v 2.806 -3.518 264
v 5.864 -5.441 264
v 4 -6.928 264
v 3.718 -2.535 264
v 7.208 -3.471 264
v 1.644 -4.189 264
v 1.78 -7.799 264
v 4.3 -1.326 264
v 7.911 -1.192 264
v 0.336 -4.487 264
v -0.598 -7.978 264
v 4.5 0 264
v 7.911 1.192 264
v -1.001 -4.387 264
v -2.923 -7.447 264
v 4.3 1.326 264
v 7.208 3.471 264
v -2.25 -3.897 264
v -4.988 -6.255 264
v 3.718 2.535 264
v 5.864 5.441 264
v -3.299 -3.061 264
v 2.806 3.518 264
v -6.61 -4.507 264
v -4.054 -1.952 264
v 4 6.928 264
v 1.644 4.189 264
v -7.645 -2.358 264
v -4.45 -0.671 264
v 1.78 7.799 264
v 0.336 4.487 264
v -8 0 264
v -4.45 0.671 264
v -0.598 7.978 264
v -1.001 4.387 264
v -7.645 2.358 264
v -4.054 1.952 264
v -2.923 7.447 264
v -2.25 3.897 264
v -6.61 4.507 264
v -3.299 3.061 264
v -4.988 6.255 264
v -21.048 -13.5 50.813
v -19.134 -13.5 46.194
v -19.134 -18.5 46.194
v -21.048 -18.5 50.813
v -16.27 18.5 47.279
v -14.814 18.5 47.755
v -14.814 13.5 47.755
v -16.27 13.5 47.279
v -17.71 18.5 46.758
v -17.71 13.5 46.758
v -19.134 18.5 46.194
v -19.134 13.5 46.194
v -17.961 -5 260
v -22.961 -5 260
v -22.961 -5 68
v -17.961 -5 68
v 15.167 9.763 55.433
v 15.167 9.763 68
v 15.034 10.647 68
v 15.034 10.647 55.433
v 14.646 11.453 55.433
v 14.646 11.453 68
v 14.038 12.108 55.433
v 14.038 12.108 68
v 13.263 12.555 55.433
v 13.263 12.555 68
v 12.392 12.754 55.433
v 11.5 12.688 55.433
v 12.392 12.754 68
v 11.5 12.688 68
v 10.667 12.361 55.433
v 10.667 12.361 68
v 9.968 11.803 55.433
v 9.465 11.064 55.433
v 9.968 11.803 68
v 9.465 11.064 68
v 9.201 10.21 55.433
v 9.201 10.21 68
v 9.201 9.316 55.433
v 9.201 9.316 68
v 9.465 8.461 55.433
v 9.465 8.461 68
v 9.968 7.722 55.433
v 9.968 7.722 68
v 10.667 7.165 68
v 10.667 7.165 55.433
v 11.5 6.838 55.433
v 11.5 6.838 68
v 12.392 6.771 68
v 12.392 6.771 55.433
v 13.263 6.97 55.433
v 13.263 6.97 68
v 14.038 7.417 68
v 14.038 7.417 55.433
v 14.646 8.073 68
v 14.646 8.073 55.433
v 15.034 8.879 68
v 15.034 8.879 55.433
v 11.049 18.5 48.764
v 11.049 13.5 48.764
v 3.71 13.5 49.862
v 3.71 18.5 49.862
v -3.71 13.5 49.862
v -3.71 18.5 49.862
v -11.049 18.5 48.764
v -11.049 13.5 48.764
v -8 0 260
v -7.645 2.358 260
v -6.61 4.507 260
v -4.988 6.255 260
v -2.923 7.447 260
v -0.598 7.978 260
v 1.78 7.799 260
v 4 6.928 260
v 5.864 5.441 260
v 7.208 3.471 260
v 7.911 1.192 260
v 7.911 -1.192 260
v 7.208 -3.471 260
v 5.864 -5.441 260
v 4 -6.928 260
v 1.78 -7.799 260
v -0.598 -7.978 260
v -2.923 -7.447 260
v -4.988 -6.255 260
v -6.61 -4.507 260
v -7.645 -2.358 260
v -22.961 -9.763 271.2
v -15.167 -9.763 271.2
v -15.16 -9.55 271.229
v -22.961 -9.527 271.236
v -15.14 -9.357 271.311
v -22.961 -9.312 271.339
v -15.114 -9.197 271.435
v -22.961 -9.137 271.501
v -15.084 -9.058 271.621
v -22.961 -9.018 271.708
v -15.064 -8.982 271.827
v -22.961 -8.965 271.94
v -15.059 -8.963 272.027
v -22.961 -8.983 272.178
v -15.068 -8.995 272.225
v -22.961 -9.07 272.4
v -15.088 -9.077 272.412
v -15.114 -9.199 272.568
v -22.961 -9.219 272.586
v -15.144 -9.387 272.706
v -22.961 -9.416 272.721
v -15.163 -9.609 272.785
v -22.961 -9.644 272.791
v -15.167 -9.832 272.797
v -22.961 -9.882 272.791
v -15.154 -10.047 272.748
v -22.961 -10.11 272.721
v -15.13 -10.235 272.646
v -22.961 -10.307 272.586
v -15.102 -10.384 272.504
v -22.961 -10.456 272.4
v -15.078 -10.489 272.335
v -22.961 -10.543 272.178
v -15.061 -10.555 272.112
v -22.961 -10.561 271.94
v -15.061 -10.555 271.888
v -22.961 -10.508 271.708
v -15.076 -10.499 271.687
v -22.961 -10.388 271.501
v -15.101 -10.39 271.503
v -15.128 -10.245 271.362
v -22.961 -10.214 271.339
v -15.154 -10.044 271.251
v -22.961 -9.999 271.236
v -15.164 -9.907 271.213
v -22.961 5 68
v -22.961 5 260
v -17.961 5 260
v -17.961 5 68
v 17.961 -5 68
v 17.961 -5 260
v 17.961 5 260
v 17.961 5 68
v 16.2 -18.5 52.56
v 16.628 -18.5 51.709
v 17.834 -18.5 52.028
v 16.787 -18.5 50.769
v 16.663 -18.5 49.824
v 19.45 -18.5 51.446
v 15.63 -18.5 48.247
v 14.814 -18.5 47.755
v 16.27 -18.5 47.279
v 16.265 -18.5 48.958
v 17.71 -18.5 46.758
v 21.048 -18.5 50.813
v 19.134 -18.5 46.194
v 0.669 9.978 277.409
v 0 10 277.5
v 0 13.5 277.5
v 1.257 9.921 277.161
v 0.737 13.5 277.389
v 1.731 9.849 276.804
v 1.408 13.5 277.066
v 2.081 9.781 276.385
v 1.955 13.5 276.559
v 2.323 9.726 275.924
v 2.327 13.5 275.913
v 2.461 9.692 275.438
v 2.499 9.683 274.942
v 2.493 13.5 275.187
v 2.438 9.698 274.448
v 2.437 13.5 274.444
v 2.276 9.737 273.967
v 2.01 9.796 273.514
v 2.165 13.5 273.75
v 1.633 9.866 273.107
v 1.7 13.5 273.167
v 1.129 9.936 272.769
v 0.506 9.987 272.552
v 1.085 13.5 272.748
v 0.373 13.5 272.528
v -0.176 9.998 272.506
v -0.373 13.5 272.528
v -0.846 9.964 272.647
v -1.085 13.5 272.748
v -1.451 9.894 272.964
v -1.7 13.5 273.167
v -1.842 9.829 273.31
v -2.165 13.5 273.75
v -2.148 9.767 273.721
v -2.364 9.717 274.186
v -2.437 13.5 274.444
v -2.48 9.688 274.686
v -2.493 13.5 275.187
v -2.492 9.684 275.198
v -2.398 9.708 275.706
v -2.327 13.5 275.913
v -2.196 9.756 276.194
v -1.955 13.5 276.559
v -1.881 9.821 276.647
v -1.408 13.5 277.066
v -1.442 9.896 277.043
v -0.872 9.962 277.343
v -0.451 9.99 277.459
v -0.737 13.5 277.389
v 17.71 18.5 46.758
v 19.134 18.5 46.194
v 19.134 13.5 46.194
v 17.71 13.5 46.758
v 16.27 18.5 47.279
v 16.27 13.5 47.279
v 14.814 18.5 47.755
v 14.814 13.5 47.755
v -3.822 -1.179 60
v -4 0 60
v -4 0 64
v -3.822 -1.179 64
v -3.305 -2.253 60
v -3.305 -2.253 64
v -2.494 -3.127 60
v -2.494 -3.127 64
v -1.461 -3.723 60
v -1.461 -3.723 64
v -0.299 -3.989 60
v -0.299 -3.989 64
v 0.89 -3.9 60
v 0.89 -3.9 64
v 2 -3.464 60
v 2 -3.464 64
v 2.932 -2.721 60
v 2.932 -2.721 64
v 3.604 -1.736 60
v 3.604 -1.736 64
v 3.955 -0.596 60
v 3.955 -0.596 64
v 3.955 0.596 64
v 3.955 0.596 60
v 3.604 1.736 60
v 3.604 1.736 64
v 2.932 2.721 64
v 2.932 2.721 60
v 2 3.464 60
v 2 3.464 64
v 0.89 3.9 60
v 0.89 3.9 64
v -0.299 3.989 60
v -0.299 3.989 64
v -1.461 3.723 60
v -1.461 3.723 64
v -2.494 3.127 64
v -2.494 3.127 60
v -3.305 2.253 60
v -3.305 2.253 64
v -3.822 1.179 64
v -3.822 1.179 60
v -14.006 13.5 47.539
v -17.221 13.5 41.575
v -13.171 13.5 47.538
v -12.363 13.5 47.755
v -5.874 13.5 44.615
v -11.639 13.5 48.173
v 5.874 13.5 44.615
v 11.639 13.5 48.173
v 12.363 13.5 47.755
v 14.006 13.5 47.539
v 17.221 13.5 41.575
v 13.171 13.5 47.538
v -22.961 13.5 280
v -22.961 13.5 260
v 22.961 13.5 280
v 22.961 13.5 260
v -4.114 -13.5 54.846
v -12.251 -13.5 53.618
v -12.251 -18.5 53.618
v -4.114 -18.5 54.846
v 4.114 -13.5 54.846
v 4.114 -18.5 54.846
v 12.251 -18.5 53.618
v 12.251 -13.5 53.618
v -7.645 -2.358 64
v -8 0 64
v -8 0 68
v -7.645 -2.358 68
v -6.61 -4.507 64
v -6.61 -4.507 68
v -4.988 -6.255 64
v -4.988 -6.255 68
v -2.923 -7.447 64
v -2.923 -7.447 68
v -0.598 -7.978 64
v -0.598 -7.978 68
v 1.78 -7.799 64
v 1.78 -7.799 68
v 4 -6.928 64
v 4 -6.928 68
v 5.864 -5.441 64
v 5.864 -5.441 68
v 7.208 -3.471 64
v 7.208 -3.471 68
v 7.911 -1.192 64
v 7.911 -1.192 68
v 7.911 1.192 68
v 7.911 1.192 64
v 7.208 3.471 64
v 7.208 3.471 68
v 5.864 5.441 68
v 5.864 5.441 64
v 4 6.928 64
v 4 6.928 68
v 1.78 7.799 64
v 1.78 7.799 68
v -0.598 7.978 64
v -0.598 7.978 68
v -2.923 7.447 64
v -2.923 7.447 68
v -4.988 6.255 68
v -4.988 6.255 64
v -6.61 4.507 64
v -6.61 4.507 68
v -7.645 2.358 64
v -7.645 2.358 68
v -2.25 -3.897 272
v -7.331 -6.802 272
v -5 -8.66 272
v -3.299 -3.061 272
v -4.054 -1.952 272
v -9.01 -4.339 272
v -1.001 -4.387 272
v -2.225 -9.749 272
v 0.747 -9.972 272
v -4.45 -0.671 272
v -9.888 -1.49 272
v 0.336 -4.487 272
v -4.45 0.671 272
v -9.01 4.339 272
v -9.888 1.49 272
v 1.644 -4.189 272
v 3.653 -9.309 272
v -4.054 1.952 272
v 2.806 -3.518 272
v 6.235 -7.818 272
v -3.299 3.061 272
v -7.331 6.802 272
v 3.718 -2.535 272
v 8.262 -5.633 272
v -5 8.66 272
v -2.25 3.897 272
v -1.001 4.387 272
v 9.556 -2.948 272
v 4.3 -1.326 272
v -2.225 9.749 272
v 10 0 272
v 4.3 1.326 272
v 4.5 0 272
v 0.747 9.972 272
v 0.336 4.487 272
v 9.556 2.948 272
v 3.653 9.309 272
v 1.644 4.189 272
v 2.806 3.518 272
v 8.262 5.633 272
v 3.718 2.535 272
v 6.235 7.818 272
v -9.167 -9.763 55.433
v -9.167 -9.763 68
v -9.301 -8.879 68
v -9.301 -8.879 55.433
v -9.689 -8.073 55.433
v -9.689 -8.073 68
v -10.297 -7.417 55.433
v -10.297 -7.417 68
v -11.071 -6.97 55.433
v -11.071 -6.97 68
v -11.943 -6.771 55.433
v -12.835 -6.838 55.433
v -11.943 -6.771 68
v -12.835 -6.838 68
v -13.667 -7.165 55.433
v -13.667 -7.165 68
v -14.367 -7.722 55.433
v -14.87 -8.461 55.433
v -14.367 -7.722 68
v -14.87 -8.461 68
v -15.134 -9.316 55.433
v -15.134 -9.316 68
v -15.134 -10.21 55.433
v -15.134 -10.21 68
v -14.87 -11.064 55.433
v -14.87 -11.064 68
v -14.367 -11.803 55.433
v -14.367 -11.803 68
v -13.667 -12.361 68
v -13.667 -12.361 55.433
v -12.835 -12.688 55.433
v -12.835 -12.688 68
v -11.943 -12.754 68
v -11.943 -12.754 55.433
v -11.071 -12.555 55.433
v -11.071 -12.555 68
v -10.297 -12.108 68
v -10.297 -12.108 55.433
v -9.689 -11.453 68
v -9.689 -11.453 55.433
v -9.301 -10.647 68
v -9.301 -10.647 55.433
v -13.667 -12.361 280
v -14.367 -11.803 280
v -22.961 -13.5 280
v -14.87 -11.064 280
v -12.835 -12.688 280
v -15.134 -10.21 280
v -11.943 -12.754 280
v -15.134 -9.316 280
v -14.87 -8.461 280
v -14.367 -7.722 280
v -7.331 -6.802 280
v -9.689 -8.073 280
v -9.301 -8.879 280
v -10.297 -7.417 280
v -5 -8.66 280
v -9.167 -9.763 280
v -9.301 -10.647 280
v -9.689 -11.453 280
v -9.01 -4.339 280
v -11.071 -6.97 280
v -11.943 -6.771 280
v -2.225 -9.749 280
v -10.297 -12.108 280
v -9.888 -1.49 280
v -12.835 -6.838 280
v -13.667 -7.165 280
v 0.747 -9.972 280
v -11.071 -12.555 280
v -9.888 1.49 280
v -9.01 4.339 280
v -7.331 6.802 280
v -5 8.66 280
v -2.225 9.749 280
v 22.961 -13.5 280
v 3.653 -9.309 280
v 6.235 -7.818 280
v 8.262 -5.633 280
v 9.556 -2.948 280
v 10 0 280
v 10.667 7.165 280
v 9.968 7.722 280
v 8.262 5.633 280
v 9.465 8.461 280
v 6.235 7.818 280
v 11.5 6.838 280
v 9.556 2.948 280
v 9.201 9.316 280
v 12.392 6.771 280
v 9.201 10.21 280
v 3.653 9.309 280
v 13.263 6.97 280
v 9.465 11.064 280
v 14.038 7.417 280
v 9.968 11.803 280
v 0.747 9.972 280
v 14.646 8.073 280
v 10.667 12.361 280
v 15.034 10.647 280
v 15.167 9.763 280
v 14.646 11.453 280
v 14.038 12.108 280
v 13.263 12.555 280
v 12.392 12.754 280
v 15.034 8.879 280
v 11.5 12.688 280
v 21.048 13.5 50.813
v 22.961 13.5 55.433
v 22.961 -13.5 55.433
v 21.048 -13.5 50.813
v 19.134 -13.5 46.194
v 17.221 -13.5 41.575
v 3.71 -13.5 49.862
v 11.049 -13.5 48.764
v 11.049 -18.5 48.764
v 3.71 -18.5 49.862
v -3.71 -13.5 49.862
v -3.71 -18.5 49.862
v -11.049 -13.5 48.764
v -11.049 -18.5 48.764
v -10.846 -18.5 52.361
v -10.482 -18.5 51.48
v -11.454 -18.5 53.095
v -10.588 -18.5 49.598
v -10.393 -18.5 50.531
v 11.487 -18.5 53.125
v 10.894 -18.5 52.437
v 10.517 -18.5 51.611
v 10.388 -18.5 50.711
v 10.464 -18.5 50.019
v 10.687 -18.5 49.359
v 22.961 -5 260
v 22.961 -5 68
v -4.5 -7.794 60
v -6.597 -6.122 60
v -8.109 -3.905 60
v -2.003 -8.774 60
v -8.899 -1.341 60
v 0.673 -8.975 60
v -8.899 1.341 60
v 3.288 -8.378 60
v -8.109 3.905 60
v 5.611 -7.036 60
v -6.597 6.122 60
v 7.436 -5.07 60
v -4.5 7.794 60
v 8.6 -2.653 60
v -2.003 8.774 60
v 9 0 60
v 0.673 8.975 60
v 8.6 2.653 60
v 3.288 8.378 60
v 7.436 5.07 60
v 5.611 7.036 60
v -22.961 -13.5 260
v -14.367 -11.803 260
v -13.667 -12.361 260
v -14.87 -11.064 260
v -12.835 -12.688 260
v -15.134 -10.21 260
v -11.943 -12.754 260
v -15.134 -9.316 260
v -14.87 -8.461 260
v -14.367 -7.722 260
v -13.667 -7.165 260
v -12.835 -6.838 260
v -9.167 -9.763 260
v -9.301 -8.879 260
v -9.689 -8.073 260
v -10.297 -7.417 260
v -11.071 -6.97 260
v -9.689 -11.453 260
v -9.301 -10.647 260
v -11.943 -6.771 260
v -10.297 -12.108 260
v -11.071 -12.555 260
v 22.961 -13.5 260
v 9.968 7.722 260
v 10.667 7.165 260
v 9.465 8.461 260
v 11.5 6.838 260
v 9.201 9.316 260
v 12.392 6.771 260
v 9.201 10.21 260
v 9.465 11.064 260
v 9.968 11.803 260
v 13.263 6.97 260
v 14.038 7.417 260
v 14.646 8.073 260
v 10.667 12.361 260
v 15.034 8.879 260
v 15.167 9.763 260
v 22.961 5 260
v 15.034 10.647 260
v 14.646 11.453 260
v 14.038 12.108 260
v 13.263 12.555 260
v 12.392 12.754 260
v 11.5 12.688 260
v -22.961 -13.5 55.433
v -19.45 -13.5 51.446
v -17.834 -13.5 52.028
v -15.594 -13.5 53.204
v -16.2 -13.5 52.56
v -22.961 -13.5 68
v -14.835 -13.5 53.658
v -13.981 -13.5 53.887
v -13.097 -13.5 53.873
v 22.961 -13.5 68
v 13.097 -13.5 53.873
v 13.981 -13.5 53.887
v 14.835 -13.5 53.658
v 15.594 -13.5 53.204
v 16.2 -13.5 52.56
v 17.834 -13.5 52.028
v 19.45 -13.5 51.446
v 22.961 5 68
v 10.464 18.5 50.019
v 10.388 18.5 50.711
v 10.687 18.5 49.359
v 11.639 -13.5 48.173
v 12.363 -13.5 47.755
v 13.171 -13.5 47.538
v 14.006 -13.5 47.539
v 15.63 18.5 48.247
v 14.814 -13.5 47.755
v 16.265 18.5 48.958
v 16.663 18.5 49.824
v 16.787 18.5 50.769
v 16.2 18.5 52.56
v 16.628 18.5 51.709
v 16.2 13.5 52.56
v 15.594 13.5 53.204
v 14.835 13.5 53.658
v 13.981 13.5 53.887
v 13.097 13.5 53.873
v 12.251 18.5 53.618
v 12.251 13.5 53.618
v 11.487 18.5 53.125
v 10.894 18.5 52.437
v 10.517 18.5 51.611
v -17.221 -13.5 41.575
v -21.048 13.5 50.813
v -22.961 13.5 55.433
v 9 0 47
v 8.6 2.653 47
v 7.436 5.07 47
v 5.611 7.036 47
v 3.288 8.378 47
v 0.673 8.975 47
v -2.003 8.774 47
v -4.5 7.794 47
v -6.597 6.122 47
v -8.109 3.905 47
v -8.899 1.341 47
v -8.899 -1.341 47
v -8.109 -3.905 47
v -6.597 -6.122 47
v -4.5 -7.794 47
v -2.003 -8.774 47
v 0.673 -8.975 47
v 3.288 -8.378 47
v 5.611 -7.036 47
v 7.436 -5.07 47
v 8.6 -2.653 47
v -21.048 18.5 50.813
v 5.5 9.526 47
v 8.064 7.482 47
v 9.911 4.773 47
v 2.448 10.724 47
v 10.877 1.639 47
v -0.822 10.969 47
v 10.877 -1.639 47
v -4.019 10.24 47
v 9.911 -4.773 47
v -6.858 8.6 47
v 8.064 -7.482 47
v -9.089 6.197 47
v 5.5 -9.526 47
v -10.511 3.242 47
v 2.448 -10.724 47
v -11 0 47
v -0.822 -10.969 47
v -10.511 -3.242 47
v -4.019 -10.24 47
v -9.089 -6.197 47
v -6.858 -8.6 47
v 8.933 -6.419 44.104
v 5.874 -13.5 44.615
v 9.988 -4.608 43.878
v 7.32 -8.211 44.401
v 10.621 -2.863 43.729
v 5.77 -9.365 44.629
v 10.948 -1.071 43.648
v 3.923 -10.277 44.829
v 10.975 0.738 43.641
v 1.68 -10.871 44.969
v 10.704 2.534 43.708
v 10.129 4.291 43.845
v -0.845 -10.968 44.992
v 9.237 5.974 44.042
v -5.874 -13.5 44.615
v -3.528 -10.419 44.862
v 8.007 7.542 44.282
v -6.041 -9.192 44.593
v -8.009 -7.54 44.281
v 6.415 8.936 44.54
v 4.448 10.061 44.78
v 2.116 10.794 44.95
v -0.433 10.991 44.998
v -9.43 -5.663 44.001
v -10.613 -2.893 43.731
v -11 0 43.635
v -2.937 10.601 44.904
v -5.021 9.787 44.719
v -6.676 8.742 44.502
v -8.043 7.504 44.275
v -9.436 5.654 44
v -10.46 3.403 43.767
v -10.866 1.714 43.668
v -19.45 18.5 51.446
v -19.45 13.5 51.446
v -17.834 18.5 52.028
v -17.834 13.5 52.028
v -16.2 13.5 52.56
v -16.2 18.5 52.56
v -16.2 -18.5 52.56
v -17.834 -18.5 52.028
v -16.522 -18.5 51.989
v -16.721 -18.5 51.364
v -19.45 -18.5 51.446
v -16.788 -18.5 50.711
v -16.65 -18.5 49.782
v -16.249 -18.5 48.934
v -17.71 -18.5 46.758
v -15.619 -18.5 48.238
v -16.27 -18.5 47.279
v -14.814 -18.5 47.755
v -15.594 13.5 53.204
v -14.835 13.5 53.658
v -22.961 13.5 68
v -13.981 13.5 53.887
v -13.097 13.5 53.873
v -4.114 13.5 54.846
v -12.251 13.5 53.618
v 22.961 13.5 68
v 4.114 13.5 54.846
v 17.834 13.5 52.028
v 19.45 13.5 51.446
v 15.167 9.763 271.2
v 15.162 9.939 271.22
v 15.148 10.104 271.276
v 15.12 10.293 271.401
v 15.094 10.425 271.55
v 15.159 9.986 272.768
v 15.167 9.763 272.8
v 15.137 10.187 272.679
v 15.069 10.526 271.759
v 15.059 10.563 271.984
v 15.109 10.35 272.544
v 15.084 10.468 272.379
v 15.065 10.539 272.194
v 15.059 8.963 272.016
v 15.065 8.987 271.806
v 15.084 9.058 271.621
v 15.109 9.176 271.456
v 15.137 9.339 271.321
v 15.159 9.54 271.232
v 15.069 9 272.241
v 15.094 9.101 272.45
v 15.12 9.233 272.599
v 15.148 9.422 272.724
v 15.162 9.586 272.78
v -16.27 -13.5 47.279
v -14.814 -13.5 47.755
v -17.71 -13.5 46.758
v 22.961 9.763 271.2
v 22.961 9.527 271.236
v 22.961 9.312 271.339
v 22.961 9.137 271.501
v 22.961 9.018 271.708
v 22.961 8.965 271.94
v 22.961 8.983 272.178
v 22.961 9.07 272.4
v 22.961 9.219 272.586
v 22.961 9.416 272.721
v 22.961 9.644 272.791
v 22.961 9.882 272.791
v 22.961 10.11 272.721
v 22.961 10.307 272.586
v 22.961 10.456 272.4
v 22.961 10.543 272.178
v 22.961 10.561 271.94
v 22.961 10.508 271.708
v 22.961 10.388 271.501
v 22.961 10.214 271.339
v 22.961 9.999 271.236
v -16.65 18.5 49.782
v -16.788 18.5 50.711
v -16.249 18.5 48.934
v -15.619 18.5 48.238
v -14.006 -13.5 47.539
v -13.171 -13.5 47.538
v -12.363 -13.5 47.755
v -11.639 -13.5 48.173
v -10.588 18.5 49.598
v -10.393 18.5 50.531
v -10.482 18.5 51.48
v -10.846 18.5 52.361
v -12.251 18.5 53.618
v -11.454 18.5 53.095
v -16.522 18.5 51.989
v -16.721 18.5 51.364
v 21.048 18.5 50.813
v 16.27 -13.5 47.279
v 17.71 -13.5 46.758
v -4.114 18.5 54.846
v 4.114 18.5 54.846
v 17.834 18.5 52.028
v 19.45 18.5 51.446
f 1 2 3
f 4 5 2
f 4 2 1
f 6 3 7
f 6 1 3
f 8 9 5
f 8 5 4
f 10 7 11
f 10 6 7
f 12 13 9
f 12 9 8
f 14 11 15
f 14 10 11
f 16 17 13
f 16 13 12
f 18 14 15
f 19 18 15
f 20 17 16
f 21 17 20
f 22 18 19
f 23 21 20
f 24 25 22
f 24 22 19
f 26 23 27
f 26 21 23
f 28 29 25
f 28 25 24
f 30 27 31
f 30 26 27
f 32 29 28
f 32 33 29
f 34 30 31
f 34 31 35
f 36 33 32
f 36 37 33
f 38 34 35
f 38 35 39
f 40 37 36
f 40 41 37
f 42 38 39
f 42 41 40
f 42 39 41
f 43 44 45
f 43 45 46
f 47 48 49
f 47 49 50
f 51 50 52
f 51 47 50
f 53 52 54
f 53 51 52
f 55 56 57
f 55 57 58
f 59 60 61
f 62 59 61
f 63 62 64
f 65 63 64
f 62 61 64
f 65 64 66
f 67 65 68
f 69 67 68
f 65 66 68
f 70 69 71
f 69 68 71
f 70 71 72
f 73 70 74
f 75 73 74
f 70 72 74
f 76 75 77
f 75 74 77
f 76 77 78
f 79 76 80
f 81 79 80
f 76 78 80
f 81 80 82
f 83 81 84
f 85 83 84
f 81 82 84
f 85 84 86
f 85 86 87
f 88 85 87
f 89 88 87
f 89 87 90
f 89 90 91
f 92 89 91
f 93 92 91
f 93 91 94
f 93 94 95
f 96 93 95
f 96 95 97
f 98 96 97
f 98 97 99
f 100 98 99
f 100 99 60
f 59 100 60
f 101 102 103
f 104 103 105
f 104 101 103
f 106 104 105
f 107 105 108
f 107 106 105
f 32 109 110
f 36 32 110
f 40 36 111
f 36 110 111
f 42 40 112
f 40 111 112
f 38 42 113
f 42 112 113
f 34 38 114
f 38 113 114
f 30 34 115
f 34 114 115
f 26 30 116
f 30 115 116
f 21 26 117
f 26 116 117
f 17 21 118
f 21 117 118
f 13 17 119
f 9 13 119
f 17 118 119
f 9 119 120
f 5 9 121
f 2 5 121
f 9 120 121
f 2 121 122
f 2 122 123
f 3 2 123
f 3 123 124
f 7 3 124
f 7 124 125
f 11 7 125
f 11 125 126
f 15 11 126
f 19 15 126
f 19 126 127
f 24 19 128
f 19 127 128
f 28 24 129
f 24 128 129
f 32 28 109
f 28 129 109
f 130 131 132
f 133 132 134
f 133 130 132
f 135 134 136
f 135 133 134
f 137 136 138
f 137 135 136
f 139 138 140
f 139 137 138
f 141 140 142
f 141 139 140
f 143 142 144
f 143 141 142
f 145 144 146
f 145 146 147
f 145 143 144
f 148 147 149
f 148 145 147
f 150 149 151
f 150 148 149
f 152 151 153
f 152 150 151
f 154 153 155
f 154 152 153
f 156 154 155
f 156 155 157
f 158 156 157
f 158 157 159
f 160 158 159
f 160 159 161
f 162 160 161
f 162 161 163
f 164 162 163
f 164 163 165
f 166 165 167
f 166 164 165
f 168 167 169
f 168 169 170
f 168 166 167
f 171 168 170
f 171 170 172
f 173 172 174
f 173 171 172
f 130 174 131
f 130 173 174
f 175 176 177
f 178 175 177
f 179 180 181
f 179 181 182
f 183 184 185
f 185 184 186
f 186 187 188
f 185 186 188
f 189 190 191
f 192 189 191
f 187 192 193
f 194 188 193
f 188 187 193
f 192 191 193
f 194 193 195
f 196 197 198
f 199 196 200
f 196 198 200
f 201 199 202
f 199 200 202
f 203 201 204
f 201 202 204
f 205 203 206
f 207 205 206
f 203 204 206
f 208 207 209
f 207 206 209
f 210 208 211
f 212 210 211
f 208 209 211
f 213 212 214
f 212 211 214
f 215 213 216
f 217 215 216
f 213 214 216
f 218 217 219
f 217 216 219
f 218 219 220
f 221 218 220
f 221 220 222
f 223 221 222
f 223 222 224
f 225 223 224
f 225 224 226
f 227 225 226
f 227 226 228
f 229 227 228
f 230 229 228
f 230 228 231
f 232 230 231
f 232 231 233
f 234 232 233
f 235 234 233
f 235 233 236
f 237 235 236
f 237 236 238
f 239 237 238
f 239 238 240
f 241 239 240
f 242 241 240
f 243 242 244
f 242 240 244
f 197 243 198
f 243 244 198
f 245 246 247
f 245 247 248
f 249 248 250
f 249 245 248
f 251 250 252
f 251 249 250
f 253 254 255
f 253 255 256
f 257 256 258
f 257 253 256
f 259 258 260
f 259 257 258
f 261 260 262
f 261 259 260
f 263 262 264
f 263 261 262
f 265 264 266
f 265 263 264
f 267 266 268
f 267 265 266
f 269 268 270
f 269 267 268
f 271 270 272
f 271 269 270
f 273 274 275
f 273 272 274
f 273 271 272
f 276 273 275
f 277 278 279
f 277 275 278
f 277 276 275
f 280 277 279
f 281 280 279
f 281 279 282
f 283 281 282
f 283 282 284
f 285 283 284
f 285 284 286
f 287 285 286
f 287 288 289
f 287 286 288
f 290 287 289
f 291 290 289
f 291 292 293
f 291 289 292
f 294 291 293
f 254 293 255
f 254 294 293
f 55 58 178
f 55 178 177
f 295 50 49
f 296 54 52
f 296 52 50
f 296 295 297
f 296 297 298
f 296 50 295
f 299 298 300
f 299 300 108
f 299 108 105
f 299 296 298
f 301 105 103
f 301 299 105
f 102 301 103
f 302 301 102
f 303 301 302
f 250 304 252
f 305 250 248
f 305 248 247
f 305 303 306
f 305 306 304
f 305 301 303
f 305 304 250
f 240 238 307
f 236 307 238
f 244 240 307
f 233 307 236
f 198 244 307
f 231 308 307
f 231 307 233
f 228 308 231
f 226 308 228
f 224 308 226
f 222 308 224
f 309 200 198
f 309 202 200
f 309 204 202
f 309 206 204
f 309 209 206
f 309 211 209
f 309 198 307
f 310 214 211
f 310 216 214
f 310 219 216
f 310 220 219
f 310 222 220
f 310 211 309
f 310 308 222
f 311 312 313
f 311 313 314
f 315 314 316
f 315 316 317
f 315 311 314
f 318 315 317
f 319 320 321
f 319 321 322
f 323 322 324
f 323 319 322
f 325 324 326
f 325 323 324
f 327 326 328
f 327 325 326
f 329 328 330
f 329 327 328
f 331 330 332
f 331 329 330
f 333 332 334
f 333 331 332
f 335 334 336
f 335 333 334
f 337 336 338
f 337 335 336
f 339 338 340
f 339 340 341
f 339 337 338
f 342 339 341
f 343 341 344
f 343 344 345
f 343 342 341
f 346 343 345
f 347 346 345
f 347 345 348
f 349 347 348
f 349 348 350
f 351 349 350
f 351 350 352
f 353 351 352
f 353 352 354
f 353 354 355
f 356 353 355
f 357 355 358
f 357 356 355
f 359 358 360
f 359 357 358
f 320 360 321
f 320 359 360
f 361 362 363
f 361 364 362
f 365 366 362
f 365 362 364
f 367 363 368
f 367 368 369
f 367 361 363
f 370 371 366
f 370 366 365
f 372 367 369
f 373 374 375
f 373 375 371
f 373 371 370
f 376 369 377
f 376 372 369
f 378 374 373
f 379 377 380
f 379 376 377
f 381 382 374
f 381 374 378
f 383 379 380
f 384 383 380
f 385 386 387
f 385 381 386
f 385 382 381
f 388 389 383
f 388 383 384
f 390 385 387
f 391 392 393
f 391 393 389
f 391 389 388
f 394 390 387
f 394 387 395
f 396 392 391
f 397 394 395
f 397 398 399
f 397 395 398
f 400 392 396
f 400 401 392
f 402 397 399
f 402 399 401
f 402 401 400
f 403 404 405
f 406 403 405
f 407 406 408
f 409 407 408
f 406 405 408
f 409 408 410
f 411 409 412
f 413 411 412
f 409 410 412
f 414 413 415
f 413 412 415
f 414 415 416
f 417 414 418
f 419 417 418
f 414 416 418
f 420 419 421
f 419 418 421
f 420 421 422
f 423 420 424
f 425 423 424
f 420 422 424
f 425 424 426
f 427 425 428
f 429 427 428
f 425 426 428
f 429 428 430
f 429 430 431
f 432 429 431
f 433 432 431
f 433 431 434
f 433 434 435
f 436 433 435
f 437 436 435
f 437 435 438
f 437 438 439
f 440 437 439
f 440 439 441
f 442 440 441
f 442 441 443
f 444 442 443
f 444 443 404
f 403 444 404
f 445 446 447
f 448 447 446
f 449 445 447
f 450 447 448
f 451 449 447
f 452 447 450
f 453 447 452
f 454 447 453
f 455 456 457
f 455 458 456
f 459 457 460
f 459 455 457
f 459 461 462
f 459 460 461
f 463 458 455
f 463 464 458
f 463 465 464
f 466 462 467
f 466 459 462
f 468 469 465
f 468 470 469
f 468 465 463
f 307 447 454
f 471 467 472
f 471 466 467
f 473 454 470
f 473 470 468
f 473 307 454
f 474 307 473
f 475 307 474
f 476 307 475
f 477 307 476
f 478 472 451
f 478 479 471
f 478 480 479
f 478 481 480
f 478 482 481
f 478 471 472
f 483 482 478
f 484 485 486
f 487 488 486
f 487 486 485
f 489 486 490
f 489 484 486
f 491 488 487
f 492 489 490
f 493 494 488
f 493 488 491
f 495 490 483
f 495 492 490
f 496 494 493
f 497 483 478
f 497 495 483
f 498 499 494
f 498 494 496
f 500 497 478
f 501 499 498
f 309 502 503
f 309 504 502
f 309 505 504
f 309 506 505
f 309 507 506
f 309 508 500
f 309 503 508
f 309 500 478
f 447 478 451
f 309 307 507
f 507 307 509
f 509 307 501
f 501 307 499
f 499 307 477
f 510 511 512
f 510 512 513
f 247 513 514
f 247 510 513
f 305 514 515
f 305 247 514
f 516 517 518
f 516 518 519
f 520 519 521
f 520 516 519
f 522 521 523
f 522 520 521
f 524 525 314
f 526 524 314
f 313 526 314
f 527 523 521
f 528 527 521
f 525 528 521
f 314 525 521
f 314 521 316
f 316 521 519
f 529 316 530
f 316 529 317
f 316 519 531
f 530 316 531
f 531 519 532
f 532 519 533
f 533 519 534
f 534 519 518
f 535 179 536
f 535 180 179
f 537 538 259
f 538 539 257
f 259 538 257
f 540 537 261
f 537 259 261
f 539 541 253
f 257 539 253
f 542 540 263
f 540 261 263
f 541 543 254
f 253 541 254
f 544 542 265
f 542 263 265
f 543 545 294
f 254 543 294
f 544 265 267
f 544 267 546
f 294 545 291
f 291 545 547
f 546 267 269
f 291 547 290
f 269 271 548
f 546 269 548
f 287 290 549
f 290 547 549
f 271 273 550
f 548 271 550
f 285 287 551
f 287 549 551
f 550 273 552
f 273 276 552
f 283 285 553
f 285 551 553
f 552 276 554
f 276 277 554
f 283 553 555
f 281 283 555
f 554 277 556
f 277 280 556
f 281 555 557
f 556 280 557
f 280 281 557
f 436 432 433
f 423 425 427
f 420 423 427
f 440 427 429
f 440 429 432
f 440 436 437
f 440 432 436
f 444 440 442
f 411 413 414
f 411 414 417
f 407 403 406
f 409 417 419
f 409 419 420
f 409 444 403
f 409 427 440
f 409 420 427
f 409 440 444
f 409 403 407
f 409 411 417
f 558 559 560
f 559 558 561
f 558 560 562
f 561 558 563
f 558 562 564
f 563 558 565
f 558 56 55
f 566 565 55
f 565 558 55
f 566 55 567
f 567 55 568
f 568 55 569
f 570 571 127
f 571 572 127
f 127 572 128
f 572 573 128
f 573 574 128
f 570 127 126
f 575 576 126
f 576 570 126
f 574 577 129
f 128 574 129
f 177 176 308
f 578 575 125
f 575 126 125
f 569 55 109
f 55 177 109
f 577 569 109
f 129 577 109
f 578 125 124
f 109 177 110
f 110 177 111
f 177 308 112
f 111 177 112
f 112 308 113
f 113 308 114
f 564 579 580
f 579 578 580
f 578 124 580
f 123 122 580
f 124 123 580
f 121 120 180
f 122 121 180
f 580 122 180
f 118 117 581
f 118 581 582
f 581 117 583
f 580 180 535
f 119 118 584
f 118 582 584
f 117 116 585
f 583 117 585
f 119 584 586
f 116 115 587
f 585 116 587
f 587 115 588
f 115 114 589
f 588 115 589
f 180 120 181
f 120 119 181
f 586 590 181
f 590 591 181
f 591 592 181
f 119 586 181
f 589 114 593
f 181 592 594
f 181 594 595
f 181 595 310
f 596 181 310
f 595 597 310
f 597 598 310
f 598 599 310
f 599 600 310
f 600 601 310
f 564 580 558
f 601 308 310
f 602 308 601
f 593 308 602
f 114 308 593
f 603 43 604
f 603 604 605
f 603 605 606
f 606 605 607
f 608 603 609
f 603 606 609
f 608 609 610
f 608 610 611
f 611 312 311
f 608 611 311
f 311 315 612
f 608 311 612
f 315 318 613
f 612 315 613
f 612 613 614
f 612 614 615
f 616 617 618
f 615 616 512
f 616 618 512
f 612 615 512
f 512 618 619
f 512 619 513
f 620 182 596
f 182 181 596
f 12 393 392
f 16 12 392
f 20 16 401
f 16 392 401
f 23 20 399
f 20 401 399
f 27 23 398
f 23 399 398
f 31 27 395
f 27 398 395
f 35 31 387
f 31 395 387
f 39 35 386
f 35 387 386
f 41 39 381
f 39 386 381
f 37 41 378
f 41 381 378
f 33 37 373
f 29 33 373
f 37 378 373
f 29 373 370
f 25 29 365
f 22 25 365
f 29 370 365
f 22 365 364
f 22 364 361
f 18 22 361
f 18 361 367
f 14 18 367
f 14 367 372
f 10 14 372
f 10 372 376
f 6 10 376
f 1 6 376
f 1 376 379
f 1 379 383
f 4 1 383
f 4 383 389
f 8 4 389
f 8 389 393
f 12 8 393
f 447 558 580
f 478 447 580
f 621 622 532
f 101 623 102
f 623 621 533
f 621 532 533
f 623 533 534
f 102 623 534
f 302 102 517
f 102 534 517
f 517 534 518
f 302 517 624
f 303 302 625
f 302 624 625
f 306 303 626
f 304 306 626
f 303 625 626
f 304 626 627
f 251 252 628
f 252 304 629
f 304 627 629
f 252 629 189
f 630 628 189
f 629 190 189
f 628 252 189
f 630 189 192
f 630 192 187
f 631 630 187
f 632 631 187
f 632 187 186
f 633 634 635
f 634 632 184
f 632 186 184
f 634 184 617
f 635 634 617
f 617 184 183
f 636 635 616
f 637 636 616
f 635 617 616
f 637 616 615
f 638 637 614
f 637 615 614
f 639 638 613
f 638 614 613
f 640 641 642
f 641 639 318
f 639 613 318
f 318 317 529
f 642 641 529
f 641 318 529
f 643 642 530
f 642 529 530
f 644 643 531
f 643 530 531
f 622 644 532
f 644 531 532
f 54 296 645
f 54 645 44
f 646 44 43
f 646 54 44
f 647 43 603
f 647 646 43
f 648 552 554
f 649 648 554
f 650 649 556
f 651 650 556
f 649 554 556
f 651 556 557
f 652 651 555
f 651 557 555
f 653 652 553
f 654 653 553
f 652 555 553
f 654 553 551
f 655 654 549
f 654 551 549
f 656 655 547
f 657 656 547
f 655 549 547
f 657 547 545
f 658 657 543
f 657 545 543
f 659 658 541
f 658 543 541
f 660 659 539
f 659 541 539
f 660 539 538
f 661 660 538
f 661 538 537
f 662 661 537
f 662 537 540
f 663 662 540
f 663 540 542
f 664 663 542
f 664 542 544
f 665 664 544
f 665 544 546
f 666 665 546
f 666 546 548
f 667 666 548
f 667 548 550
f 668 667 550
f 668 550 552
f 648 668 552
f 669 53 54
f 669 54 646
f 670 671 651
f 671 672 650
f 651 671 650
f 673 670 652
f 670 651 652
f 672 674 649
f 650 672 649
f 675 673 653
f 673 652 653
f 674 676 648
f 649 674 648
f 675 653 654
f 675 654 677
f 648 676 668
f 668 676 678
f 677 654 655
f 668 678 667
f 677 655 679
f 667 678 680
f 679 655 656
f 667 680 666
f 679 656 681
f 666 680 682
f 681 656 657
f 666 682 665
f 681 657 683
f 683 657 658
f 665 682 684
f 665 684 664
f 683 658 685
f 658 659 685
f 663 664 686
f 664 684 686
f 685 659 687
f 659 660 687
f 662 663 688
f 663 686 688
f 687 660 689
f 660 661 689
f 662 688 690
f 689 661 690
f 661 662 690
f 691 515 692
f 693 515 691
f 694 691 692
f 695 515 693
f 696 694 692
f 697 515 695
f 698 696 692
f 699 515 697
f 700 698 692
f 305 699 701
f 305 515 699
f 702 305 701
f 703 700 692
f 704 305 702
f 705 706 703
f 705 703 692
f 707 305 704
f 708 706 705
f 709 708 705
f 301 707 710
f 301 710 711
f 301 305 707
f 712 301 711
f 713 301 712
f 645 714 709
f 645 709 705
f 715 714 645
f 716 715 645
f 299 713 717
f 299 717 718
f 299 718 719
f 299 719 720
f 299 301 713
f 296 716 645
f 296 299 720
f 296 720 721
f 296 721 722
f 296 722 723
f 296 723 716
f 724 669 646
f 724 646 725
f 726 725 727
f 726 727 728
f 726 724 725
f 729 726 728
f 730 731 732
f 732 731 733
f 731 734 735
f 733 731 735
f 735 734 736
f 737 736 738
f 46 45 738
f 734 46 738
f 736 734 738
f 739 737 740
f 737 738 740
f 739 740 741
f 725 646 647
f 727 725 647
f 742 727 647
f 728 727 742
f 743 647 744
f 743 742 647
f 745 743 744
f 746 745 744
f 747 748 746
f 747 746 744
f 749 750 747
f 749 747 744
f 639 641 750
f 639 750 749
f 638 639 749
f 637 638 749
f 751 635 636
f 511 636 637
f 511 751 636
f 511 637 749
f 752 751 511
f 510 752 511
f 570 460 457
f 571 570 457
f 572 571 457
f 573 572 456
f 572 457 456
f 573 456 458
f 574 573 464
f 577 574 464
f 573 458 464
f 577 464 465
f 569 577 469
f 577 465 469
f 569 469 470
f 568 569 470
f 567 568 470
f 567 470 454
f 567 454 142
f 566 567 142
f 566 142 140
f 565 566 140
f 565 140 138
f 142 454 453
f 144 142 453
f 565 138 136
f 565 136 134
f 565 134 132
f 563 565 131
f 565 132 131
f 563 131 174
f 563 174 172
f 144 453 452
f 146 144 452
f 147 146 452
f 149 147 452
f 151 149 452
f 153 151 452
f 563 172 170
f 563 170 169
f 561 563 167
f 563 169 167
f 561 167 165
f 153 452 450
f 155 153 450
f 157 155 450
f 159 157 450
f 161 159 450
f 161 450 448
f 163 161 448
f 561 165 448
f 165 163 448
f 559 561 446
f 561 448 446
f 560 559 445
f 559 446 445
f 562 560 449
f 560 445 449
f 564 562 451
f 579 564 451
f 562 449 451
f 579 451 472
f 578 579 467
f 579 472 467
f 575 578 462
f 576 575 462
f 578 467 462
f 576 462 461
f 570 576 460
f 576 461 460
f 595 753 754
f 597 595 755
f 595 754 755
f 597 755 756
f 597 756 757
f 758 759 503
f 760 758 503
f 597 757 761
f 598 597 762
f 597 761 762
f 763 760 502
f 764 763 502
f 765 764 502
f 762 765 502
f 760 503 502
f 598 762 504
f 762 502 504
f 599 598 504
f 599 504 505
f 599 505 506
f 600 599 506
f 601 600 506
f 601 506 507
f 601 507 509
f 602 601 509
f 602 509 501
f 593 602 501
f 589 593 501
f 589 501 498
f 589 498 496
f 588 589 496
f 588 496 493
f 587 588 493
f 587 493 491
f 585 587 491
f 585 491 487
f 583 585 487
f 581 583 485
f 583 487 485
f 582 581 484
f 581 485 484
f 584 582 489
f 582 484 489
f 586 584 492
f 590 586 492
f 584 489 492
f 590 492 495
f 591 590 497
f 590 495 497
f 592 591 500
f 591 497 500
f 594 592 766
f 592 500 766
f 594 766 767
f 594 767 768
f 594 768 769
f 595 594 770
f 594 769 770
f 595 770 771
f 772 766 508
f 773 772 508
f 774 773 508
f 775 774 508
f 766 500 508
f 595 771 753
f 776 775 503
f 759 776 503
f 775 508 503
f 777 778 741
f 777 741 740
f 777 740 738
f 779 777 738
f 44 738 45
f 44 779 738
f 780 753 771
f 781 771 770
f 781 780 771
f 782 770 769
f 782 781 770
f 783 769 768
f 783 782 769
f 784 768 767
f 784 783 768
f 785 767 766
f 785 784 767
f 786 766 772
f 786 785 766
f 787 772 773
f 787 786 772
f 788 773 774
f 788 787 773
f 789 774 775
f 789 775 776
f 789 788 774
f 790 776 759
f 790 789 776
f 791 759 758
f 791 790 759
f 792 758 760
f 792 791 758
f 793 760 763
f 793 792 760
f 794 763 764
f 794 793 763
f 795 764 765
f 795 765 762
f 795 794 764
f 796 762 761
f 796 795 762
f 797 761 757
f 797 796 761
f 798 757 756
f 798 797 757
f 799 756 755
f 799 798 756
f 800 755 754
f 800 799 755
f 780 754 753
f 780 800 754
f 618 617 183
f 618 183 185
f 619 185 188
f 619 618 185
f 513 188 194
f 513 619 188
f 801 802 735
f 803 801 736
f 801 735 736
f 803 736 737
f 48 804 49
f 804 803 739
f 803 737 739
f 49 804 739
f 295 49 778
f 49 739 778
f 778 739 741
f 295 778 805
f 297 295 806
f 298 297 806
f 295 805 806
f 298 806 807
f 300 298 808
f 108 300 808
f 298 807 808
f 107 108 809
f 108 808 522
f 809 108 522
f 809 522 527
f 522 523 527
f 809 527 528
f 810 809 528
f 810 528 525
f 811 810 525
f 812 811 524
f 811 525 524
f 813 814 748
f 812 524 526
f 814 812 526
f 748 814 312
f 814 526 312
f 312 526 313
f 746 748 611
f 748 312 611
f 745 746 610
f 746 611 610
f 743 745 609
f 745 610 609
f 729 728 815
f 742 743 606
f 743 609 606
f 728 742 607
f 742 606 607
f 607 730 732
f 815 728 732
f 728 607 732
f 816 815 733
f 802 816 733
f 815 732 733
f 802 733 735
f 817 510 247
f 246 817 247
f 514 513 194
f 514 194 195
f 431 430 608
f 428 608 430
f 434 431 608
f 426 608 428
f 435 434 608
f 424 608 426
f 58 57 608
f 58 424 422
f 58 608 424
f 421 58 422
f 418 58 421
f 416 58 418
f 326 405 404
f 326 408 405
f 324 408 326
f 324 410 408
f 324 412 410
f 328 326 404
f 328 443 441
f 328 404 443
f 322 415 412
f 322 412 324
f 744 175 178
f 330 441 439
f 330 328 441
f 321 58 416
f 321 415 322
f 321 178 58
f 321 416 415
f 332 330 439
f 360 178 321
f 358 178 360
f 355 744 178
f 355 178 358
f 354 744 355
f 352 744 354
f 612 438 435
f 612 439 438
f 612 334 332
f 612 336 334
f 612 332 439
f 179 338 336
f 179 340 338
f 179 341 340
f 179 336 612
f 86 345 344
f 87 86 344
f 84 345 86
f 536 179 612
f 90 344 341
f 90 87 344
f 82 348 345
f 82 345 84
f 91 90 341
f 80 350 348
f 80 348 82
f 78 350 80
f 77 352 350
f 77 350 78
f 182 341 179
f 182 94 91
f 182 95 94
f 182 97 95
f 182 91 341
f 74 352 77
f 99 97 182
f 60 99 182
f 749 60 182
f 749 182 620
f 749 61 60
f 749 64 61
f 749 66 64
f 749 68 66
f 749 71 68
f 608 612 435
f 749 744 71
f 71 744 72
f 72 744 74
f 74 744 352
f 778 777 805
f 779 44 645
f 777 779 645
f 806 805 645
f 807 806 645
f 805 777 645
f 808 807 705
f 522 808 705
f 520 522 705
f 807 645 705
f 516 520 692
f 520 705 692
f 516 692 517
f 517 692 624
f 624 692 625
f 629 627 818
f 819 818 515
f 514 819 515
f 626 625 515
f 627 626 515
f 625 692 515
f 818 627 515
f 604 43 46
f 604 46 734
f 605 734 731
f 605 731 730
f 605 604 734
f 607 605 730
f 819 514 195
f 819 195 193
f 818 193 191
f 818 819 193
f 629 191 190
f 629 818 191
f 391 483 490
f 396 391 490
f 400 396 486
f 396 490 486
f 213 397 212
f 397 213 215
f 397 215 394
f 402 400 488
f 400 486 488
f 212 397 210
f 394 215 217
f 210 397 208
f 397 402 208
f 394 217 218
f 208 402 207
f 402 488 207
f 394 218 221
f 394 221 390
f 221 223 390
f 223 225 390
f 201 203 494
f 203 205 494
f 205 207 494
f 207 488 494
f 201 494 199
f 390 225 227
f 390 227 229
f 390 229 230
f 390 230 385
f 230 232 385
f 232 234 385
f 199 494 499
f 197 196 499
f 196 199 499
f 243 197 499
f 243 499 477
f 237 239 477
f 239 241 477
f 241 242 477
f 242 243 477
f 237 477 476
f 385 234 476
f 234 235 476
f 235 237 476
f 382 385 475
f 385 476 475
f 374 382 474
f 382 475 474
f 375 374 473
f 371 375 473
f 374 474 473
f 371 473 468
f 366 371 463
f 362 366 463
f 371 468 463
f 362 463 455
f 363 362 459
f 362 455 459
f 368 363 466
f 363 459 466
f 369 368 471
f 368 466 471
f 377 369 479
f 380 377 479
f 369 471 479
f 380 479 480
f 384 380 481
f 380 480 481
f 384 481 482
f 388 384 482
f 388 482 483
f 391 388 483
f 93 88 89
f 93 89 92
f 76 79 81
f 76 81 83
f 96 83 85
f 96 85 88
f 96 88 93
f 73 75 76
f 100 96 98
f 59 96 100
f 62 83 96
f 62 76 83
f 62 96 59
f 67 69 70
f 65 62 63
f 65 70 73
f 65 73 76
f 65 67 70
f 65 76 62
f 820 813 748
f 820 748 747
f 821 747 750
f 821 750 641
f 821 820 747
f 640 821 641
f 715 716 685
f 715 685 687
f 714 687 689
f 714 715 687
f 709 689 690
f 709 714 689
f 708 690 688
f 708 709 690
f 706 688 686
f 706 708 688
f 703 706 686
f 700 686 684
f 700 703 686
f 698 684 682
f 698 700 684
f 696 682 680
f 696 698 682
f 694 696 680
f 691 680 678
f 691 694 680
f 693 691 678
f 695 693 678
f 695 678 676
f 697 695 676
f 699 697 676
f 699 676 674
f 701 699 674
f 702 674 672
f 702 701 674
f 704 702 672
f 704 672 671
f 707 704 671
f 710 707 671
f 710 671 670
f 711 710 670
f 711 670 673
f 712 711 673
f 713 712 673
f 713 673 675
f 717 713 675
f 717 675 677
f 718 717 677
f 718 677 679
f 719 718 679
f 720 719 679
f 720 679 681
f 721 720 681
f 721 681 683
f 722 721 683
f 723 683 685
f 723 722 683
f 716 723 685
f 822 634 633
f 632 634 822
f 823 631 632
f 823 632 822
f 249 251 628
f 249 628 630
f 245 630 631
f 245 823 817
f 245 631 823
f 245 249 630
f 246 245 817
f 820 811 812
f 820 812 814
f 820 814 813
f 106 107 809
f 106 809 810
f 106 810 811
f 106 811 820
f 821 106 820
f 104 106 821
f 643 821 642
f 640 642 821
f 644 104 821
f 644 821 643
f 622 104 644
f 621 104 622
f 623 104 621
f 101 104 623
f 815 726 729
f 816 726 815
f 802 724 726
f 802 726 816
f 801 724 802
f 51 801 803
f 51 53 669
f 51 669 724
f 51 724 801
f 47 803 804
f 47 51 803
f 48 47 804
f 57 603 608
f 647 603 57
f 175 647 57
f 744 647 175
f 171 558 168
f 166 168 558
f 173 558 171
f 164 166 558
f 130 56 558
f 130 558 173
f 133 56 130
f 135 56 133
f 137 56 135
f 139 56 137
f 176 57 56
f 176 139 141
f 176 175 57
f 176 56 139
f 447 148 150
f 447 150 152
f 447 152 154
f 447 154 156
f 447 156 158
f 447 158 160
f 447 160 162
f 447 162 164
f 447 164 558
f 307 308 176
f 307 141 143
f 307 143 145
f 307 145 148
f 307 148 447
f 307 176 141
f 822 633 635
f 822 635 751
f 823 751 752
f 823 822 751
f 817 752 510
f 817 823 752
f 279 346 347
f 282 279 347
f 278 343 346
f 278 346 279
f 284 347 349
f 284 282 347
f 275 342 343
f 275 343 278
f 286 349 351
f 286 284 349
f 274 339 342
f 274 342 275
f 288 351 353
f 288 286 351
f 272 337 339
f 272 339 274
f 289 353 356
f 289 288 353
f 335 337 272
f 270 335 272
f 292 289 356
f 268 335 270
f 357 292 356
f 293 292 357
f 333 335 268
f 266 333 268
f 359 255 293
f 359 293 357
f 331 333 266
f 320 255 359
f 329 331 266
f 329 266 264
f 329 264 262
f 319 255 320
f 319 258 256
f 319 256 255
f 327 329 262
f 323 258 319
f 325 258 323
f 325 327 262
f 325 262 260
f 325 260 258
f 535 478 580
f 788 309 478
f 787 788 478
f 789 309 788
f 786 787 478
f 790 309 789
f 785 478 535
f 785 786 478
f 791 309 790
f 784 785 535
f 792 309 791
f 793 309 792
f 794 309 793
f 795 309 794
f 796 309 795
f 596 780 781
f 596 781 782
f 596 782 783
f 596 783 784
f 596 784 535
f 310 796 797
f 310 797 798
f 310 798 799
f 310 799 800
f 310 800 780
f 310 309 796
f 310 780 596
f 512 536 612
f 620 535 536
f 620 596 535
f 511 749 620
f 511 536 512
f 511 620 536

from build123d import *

# Parameters (mm, degrees)
BOSS_EXTRUDE1_DEPTH      = 13.5
BOSS_EXTRUDE2_DEPTH      = 18.5
BOSS_EXTRUDE3_DEPTH      = 5
SKETCH4_W                = 45.922011884
SKETCH4_H                = 20
BOSS_EXTRUDE4_DEPTH      = 13.5
SKETCH2_R                = 4
CUT_EXTRUDE1_DEPTH       = 282.548322307
SKETCH5_R                = 8
CUT_EXTRUDE2_DEPTH       = 4
SKETCH6_R                = 10
CUT_EXTRUDE3_DEPTH       = 8
BOSS_EXTRUDE5_DEPTH      = 13.5
CUT_EXTRUDE5_REACH       = 223.967
CUT_EXTRUDE5_END_RADIUS  = 45
SKETCH8_R                = 9
CUT_EXTRUDE6_REACH       = 223.967
SKETCH10_R               = 4
CUT_EXTRUDE7_START       = -4
SKETCH11_R               = 8
CUT_EXTRUDE7_DEPTH       = 4
SKETCH15_R               = 3
CUT_EXTRUDE8_DEPTH       = 224.567228
M6_CLEARANCE_HOLE1_D     = 6.4
CUT_EXTRUDE9_REACH       = 234.304
SKETCH20_R               = 4.5
CIRPATTERN1_COUNT        = 2
CUT_EXTRUDE10_REACH      = 284.756
CUT_EXTRUDE10_END_RADIUS = 10
SKETCH21_R               = 2.5
SKETCH22_R               = 11
CUT_EXTRUDE11_DEPTH      = 47


with BuildPart() as part:
    # Sketch1 → Boss-Extrude1 (new, symmetric)
    with BuildSketch(Plane(origin=(0, 0, 0), x_dir=(1, 0, 0), z_dir=(0, 1, 0))):
        with BuildLine():
            ThreePointArc((17.220754456, -41.574578963), (0, -45), (-17.220754456, -41.574578963))
            Line((-17.220754456, -41.574578963), (-22.961005942, -55.432771951))
            ThreePointArc((-22.961005942, -55.432771951), (0, -60), (22.961005942, -55.432771951))
            Line((22.961005942, -55.432771951), (17.220754456, -41.574578963))
        make_face()
    extrude(amount=BOSS_EXTRUDE1_DEPTH, both=True)

    # Sketch1<3> → Boss-Extrude2 (add, symmetric)
    with BuildSketch(Plane(origin=(0, 0, 0), x_dir=(1, 0, 0), z_dir=(0, 1, 0))):
        with BuildLine():
            ThreePointArc((19.134171618, -46.193976626), (0, -50), (-19.134171618, -46.193976626))
            Line((-19.134171618, -46.193976626), (-21.04758878, -50.813374288))
            ThreePointArc((-21.04758878, -50.813374288), (0, -55), (21.04758878, -50.813374288))
            Line((21.04758878, -50.813374288), (19.134171618, -46.193976626))
        make_face()
    extrude(amount=BOSS_EXTRUDE2_DEPTH, both=True)

    # Sketch3 → Boss-Extrude3 (add, symmetric)
    with BuildSketch(Plane.XZ):
        with BuildLine():
            Line((-22.961005942, 280), (-22.961005942, 55.432771951))
            ThreePointArc((-22.961005942, 55.432771951), (-20.481139434, 56.39612511), (-17.961005942, 57.248600555))
            Line((-17.961005942, 57.248600555), (-17.961005942, 260))
            Line((-17.961005942, 260), (17.961005942, 260))
            Line((17.961005942, 260), (17.961005942, 57.248600555))
            ThreePointArc((17.961005942, 57.248600555), (20.481139434, 56.39612511), (22.961005942, 55.432771951))
            Line((22.961005942, 55.432771951), (22.961005942, 280))
            Line((22.961005942, 280), (-22.961005942, 280))
        make_face()
    extrude(amount=BOSS_EXTRUDE3_DEPTH, both=True)

    # Sketch4 → Boss-Extrude4 (add, symmetric)
    with BuildSketch(Plane(origin=(0, 0, 0), x_dir=(1, 0, 0), z_dir=(0, 1, 0))):
        with Locations((0, -270)):
            Rectangle(SKETCH4_W, SKETCH4_H)
    extrude(amount=BOSS_EXTRUDE4_DEPTH, both=True)

    # Sketch2 → Cut-Extrude1 (cut, through all)
    with BuildSketch(Plane.XY):
        with Locations(Location((0, 0, 0), (0, 0, 180))):
            Circle(SKETCH2_R)
    extrude(amount=CUT_EXTRUDE1_DEPTH, mode=Mode.SUBTRACT)

    # Sketch5 → Cut-Extrude2 (cut)
    with BuildSketch(Plane(origin=(0, 0, 260), x_dir=(-1, 0, 0), z_dir=(0, 0, -1))):
        Circle(SKETCH5_R)
    extrude(amount=-CUT_EXTRUDE2_DEPTH, mode=Mode.SUBTRACT)

    # Sketch6 → Cut-Extrude3 (cut)
    with BuildSketch(Plane.XY.offset(280)):
        Circle(SKETCH6_R)
    extrude(amount=-CUT_EXTRUDE3_DEPTH, mode=Mode.SUBTRACT)

    # Sketch9 → Boss-Extrude5 (add, symmetric)
    with BuildSketch(Plane(origin=(0, 0, 0), x_dir=(1, 0, 0), z_dir=(0, 1, 0))):
        with BuildLine():
            Line((-22.961005942, -55.432771951), (-22.961005942, -68))
            Line((-22.961005942, -68), (22.961005942, -68))
            Line((22.961005942, -68), (22.961005942, -55.432771951))
            ThreePointArc((22.961005942, -55.432771951), (0, -60), (-22.961005942, -55.432771951))
        make_face()
    extrude(amount=BOSS_EXTRUDE5_DEPTH, both=True)

    # Cut-Extrude5: up to this cylinder (the profile starts outside it)
    cut_extrude5_end = Plane(origin=(0, 0, 0), z_dir=(0, -1, 0)) * Cylinder(CUT_EXTRUDE5_END_RADIUS, 538.934, mode=Mode.PRIVATE)
    # Sketch8 → Cut-Extrude5 (cut, up to the surface)
    with BuildSketch(Plane.XY.offset(60), mode=Mode.PRIVATE) as cut_extrude5_sk1:
        Circle(SKETCH8_R)
    cut_extrude5_tool1 = extrude(cut_extrude5_sk1.sketch, amount=-CUT_EXTRUDE5_REACH, mode=Mode.PRIVATE) - cut_extrude5_end
    add(cut_extrude5_tool1.solids().sort_by_distance((0, 0, 60))[0], mode=Mode.SUBTRACT)

    # Sketch10 → Cut-Extrude6 (cut, up to next)
    with BuildSketch(Plane.XY.offset(60), mode=Mode.PRIVATE) as cut_extrude6_sk1:
        with Locations(Location((0, 0, 0), (0, 0, 180))):
            Circle(SKETCH10_R)
    cut_extrude6_tool1 = extrude(cut_extrude6_sk1.sketch, amount=CUT_EXTRUDE6_REACH, mode=Mode.PRIVATE) & part.part
    add(cut_extrude6_tool1.solids().sort_by_distance((0, 0, 60))[0], mode=Mode.SUBTRACT)

    # Sketch11 → Cut-Extrude7 (cut)
    with BuildSketch(Plane.XY.offset(68).offset(CUT_EXTRUDE7_START)):
        with Locations(Location((0, 0, 0), (0, 0, 180))):
            Circle(SKETCH11_R)
    extrude(amount=CUT_EXTRUDE7_DEPTH, mode=Mode.SUBTRACT)

    # Sketch15 → Cut-Extrude8 (cut)
    with BuildSketch(Plane.XY.offset(280)):
        with Locations((-12.167449647, -9.762846361)):
            Circle(SKETCH15_R)
        with Locations((12.167449647, 9.762846361)):
            Circle(SKETCH15_R)
    extrude(amount=-CUT_EXTRUDE8_DEPTH, mode=Mode.SUBTRACT)

    # Sketch17 → M2 Tapped Hole1 (revolve, cut)
    with BuildSketch(Plane(origin=(22.961005942, 9.762846361, 272), x_dir=(0, 0, -1), z_dir=(0, 1, 0))):
        Polygon((0, 0), (0, 10.480688495), (0.8, 10), (0.8, 0), align=None)
    m2_tapped_hole1 = revolve(axis=Axis((29.311005942, 9.762846361, 272), (-1, 0, 0)), mode=Mode.SUBTRACT)

    # M6 Clearance Hole1 (through all)
    with Locations(Plane(origin=(0, 18.5, 0), x_dir=(1, 0, 0), z_dir=(0, 1, 0))):
        with Locations((13.587999868, -50.71110588), (-13.587999868, -50.71110588)):
            Hole(M6_CLEARANCE_HOLE1_D / 2)

    # Sketch20 → Cut-Extrude9 (cut, up to next)
    with BuildSketch(Plane.XY.offset(272), mode=Mode.PRIVATE) as cut_extrude9_sk1:
        Circle(SKETCH20_R)
    cut_extrude9_tool1 = extrude(cut_extrude9_sk1.sketch, amount=-CUT_EXTRUDE9_REACH, mode=Mode.PRIVATE) & part.part
    add(cut_extrude9_tool1.solids().sort_by_distance((0, 0, 272))[0], mode=Mode.SUBTRACT)

    # CirPattern1: M2 Tapped Hole1 ×2 about axis
    cirpattern1_axis = Axis((0, 0, 68), (0, 0, 1))
    for i in range(1, CIRPATTERN1_COUNT):
        add(m2_tapped_hole1.rotate(cirpattern1_axis, i * 360 / CIRPATTERN1_COUNT), mode=Mode.SUBTRACT)

    # Cut-Extrude10: up to this cylinder (the profile starts outside it)
    cut_extrude10_end = Plane(origin=(0, 0, 275), z_dir=(0, 0, 1)) * Cylinder(CUT_EXTRUDE10_END_RADIUS, 590.512, mode=Mode.PRIVATE)
    # Sketch21 → Cut-Extrude10 (cut, up to the surface)
    with BuildSketch(Plane(origin=(0, 13.5, 0), x_dir=(1, 0, 0), z_dir=(0, 1, 0)), mode=Mode.PRIVATE) as cut_extrude10_sk1:
        with Locations(Location((0, -275, 0), (0, 0, 270))):
            Circle(SKETCH21_R)
    cut_extrude10_tool1 = extrude(cut_extrude10_sk1.sketch, amount=-CUT_EXTRUDE10_REACH, mode=Mode.PRIVATE) - cut_extrude10_end
    add(cut_extrude10_tool1.solids().sort_by_distance((0, 13.5, 275))[0], mode=Mode.SUBTRACT)

    # Sketch22 → Cut-Extrude11 (cut)
    with BuildSketch(Plane.XY):
        with Locations(Location((0, 0, 0), (0, 0, 180))):
            Circle(SKETCH22_R)
    extrude(amount=CUT_EXTRUDE11_DEPTH, mode=Mode.SUBTRACT)


solid = part.part
